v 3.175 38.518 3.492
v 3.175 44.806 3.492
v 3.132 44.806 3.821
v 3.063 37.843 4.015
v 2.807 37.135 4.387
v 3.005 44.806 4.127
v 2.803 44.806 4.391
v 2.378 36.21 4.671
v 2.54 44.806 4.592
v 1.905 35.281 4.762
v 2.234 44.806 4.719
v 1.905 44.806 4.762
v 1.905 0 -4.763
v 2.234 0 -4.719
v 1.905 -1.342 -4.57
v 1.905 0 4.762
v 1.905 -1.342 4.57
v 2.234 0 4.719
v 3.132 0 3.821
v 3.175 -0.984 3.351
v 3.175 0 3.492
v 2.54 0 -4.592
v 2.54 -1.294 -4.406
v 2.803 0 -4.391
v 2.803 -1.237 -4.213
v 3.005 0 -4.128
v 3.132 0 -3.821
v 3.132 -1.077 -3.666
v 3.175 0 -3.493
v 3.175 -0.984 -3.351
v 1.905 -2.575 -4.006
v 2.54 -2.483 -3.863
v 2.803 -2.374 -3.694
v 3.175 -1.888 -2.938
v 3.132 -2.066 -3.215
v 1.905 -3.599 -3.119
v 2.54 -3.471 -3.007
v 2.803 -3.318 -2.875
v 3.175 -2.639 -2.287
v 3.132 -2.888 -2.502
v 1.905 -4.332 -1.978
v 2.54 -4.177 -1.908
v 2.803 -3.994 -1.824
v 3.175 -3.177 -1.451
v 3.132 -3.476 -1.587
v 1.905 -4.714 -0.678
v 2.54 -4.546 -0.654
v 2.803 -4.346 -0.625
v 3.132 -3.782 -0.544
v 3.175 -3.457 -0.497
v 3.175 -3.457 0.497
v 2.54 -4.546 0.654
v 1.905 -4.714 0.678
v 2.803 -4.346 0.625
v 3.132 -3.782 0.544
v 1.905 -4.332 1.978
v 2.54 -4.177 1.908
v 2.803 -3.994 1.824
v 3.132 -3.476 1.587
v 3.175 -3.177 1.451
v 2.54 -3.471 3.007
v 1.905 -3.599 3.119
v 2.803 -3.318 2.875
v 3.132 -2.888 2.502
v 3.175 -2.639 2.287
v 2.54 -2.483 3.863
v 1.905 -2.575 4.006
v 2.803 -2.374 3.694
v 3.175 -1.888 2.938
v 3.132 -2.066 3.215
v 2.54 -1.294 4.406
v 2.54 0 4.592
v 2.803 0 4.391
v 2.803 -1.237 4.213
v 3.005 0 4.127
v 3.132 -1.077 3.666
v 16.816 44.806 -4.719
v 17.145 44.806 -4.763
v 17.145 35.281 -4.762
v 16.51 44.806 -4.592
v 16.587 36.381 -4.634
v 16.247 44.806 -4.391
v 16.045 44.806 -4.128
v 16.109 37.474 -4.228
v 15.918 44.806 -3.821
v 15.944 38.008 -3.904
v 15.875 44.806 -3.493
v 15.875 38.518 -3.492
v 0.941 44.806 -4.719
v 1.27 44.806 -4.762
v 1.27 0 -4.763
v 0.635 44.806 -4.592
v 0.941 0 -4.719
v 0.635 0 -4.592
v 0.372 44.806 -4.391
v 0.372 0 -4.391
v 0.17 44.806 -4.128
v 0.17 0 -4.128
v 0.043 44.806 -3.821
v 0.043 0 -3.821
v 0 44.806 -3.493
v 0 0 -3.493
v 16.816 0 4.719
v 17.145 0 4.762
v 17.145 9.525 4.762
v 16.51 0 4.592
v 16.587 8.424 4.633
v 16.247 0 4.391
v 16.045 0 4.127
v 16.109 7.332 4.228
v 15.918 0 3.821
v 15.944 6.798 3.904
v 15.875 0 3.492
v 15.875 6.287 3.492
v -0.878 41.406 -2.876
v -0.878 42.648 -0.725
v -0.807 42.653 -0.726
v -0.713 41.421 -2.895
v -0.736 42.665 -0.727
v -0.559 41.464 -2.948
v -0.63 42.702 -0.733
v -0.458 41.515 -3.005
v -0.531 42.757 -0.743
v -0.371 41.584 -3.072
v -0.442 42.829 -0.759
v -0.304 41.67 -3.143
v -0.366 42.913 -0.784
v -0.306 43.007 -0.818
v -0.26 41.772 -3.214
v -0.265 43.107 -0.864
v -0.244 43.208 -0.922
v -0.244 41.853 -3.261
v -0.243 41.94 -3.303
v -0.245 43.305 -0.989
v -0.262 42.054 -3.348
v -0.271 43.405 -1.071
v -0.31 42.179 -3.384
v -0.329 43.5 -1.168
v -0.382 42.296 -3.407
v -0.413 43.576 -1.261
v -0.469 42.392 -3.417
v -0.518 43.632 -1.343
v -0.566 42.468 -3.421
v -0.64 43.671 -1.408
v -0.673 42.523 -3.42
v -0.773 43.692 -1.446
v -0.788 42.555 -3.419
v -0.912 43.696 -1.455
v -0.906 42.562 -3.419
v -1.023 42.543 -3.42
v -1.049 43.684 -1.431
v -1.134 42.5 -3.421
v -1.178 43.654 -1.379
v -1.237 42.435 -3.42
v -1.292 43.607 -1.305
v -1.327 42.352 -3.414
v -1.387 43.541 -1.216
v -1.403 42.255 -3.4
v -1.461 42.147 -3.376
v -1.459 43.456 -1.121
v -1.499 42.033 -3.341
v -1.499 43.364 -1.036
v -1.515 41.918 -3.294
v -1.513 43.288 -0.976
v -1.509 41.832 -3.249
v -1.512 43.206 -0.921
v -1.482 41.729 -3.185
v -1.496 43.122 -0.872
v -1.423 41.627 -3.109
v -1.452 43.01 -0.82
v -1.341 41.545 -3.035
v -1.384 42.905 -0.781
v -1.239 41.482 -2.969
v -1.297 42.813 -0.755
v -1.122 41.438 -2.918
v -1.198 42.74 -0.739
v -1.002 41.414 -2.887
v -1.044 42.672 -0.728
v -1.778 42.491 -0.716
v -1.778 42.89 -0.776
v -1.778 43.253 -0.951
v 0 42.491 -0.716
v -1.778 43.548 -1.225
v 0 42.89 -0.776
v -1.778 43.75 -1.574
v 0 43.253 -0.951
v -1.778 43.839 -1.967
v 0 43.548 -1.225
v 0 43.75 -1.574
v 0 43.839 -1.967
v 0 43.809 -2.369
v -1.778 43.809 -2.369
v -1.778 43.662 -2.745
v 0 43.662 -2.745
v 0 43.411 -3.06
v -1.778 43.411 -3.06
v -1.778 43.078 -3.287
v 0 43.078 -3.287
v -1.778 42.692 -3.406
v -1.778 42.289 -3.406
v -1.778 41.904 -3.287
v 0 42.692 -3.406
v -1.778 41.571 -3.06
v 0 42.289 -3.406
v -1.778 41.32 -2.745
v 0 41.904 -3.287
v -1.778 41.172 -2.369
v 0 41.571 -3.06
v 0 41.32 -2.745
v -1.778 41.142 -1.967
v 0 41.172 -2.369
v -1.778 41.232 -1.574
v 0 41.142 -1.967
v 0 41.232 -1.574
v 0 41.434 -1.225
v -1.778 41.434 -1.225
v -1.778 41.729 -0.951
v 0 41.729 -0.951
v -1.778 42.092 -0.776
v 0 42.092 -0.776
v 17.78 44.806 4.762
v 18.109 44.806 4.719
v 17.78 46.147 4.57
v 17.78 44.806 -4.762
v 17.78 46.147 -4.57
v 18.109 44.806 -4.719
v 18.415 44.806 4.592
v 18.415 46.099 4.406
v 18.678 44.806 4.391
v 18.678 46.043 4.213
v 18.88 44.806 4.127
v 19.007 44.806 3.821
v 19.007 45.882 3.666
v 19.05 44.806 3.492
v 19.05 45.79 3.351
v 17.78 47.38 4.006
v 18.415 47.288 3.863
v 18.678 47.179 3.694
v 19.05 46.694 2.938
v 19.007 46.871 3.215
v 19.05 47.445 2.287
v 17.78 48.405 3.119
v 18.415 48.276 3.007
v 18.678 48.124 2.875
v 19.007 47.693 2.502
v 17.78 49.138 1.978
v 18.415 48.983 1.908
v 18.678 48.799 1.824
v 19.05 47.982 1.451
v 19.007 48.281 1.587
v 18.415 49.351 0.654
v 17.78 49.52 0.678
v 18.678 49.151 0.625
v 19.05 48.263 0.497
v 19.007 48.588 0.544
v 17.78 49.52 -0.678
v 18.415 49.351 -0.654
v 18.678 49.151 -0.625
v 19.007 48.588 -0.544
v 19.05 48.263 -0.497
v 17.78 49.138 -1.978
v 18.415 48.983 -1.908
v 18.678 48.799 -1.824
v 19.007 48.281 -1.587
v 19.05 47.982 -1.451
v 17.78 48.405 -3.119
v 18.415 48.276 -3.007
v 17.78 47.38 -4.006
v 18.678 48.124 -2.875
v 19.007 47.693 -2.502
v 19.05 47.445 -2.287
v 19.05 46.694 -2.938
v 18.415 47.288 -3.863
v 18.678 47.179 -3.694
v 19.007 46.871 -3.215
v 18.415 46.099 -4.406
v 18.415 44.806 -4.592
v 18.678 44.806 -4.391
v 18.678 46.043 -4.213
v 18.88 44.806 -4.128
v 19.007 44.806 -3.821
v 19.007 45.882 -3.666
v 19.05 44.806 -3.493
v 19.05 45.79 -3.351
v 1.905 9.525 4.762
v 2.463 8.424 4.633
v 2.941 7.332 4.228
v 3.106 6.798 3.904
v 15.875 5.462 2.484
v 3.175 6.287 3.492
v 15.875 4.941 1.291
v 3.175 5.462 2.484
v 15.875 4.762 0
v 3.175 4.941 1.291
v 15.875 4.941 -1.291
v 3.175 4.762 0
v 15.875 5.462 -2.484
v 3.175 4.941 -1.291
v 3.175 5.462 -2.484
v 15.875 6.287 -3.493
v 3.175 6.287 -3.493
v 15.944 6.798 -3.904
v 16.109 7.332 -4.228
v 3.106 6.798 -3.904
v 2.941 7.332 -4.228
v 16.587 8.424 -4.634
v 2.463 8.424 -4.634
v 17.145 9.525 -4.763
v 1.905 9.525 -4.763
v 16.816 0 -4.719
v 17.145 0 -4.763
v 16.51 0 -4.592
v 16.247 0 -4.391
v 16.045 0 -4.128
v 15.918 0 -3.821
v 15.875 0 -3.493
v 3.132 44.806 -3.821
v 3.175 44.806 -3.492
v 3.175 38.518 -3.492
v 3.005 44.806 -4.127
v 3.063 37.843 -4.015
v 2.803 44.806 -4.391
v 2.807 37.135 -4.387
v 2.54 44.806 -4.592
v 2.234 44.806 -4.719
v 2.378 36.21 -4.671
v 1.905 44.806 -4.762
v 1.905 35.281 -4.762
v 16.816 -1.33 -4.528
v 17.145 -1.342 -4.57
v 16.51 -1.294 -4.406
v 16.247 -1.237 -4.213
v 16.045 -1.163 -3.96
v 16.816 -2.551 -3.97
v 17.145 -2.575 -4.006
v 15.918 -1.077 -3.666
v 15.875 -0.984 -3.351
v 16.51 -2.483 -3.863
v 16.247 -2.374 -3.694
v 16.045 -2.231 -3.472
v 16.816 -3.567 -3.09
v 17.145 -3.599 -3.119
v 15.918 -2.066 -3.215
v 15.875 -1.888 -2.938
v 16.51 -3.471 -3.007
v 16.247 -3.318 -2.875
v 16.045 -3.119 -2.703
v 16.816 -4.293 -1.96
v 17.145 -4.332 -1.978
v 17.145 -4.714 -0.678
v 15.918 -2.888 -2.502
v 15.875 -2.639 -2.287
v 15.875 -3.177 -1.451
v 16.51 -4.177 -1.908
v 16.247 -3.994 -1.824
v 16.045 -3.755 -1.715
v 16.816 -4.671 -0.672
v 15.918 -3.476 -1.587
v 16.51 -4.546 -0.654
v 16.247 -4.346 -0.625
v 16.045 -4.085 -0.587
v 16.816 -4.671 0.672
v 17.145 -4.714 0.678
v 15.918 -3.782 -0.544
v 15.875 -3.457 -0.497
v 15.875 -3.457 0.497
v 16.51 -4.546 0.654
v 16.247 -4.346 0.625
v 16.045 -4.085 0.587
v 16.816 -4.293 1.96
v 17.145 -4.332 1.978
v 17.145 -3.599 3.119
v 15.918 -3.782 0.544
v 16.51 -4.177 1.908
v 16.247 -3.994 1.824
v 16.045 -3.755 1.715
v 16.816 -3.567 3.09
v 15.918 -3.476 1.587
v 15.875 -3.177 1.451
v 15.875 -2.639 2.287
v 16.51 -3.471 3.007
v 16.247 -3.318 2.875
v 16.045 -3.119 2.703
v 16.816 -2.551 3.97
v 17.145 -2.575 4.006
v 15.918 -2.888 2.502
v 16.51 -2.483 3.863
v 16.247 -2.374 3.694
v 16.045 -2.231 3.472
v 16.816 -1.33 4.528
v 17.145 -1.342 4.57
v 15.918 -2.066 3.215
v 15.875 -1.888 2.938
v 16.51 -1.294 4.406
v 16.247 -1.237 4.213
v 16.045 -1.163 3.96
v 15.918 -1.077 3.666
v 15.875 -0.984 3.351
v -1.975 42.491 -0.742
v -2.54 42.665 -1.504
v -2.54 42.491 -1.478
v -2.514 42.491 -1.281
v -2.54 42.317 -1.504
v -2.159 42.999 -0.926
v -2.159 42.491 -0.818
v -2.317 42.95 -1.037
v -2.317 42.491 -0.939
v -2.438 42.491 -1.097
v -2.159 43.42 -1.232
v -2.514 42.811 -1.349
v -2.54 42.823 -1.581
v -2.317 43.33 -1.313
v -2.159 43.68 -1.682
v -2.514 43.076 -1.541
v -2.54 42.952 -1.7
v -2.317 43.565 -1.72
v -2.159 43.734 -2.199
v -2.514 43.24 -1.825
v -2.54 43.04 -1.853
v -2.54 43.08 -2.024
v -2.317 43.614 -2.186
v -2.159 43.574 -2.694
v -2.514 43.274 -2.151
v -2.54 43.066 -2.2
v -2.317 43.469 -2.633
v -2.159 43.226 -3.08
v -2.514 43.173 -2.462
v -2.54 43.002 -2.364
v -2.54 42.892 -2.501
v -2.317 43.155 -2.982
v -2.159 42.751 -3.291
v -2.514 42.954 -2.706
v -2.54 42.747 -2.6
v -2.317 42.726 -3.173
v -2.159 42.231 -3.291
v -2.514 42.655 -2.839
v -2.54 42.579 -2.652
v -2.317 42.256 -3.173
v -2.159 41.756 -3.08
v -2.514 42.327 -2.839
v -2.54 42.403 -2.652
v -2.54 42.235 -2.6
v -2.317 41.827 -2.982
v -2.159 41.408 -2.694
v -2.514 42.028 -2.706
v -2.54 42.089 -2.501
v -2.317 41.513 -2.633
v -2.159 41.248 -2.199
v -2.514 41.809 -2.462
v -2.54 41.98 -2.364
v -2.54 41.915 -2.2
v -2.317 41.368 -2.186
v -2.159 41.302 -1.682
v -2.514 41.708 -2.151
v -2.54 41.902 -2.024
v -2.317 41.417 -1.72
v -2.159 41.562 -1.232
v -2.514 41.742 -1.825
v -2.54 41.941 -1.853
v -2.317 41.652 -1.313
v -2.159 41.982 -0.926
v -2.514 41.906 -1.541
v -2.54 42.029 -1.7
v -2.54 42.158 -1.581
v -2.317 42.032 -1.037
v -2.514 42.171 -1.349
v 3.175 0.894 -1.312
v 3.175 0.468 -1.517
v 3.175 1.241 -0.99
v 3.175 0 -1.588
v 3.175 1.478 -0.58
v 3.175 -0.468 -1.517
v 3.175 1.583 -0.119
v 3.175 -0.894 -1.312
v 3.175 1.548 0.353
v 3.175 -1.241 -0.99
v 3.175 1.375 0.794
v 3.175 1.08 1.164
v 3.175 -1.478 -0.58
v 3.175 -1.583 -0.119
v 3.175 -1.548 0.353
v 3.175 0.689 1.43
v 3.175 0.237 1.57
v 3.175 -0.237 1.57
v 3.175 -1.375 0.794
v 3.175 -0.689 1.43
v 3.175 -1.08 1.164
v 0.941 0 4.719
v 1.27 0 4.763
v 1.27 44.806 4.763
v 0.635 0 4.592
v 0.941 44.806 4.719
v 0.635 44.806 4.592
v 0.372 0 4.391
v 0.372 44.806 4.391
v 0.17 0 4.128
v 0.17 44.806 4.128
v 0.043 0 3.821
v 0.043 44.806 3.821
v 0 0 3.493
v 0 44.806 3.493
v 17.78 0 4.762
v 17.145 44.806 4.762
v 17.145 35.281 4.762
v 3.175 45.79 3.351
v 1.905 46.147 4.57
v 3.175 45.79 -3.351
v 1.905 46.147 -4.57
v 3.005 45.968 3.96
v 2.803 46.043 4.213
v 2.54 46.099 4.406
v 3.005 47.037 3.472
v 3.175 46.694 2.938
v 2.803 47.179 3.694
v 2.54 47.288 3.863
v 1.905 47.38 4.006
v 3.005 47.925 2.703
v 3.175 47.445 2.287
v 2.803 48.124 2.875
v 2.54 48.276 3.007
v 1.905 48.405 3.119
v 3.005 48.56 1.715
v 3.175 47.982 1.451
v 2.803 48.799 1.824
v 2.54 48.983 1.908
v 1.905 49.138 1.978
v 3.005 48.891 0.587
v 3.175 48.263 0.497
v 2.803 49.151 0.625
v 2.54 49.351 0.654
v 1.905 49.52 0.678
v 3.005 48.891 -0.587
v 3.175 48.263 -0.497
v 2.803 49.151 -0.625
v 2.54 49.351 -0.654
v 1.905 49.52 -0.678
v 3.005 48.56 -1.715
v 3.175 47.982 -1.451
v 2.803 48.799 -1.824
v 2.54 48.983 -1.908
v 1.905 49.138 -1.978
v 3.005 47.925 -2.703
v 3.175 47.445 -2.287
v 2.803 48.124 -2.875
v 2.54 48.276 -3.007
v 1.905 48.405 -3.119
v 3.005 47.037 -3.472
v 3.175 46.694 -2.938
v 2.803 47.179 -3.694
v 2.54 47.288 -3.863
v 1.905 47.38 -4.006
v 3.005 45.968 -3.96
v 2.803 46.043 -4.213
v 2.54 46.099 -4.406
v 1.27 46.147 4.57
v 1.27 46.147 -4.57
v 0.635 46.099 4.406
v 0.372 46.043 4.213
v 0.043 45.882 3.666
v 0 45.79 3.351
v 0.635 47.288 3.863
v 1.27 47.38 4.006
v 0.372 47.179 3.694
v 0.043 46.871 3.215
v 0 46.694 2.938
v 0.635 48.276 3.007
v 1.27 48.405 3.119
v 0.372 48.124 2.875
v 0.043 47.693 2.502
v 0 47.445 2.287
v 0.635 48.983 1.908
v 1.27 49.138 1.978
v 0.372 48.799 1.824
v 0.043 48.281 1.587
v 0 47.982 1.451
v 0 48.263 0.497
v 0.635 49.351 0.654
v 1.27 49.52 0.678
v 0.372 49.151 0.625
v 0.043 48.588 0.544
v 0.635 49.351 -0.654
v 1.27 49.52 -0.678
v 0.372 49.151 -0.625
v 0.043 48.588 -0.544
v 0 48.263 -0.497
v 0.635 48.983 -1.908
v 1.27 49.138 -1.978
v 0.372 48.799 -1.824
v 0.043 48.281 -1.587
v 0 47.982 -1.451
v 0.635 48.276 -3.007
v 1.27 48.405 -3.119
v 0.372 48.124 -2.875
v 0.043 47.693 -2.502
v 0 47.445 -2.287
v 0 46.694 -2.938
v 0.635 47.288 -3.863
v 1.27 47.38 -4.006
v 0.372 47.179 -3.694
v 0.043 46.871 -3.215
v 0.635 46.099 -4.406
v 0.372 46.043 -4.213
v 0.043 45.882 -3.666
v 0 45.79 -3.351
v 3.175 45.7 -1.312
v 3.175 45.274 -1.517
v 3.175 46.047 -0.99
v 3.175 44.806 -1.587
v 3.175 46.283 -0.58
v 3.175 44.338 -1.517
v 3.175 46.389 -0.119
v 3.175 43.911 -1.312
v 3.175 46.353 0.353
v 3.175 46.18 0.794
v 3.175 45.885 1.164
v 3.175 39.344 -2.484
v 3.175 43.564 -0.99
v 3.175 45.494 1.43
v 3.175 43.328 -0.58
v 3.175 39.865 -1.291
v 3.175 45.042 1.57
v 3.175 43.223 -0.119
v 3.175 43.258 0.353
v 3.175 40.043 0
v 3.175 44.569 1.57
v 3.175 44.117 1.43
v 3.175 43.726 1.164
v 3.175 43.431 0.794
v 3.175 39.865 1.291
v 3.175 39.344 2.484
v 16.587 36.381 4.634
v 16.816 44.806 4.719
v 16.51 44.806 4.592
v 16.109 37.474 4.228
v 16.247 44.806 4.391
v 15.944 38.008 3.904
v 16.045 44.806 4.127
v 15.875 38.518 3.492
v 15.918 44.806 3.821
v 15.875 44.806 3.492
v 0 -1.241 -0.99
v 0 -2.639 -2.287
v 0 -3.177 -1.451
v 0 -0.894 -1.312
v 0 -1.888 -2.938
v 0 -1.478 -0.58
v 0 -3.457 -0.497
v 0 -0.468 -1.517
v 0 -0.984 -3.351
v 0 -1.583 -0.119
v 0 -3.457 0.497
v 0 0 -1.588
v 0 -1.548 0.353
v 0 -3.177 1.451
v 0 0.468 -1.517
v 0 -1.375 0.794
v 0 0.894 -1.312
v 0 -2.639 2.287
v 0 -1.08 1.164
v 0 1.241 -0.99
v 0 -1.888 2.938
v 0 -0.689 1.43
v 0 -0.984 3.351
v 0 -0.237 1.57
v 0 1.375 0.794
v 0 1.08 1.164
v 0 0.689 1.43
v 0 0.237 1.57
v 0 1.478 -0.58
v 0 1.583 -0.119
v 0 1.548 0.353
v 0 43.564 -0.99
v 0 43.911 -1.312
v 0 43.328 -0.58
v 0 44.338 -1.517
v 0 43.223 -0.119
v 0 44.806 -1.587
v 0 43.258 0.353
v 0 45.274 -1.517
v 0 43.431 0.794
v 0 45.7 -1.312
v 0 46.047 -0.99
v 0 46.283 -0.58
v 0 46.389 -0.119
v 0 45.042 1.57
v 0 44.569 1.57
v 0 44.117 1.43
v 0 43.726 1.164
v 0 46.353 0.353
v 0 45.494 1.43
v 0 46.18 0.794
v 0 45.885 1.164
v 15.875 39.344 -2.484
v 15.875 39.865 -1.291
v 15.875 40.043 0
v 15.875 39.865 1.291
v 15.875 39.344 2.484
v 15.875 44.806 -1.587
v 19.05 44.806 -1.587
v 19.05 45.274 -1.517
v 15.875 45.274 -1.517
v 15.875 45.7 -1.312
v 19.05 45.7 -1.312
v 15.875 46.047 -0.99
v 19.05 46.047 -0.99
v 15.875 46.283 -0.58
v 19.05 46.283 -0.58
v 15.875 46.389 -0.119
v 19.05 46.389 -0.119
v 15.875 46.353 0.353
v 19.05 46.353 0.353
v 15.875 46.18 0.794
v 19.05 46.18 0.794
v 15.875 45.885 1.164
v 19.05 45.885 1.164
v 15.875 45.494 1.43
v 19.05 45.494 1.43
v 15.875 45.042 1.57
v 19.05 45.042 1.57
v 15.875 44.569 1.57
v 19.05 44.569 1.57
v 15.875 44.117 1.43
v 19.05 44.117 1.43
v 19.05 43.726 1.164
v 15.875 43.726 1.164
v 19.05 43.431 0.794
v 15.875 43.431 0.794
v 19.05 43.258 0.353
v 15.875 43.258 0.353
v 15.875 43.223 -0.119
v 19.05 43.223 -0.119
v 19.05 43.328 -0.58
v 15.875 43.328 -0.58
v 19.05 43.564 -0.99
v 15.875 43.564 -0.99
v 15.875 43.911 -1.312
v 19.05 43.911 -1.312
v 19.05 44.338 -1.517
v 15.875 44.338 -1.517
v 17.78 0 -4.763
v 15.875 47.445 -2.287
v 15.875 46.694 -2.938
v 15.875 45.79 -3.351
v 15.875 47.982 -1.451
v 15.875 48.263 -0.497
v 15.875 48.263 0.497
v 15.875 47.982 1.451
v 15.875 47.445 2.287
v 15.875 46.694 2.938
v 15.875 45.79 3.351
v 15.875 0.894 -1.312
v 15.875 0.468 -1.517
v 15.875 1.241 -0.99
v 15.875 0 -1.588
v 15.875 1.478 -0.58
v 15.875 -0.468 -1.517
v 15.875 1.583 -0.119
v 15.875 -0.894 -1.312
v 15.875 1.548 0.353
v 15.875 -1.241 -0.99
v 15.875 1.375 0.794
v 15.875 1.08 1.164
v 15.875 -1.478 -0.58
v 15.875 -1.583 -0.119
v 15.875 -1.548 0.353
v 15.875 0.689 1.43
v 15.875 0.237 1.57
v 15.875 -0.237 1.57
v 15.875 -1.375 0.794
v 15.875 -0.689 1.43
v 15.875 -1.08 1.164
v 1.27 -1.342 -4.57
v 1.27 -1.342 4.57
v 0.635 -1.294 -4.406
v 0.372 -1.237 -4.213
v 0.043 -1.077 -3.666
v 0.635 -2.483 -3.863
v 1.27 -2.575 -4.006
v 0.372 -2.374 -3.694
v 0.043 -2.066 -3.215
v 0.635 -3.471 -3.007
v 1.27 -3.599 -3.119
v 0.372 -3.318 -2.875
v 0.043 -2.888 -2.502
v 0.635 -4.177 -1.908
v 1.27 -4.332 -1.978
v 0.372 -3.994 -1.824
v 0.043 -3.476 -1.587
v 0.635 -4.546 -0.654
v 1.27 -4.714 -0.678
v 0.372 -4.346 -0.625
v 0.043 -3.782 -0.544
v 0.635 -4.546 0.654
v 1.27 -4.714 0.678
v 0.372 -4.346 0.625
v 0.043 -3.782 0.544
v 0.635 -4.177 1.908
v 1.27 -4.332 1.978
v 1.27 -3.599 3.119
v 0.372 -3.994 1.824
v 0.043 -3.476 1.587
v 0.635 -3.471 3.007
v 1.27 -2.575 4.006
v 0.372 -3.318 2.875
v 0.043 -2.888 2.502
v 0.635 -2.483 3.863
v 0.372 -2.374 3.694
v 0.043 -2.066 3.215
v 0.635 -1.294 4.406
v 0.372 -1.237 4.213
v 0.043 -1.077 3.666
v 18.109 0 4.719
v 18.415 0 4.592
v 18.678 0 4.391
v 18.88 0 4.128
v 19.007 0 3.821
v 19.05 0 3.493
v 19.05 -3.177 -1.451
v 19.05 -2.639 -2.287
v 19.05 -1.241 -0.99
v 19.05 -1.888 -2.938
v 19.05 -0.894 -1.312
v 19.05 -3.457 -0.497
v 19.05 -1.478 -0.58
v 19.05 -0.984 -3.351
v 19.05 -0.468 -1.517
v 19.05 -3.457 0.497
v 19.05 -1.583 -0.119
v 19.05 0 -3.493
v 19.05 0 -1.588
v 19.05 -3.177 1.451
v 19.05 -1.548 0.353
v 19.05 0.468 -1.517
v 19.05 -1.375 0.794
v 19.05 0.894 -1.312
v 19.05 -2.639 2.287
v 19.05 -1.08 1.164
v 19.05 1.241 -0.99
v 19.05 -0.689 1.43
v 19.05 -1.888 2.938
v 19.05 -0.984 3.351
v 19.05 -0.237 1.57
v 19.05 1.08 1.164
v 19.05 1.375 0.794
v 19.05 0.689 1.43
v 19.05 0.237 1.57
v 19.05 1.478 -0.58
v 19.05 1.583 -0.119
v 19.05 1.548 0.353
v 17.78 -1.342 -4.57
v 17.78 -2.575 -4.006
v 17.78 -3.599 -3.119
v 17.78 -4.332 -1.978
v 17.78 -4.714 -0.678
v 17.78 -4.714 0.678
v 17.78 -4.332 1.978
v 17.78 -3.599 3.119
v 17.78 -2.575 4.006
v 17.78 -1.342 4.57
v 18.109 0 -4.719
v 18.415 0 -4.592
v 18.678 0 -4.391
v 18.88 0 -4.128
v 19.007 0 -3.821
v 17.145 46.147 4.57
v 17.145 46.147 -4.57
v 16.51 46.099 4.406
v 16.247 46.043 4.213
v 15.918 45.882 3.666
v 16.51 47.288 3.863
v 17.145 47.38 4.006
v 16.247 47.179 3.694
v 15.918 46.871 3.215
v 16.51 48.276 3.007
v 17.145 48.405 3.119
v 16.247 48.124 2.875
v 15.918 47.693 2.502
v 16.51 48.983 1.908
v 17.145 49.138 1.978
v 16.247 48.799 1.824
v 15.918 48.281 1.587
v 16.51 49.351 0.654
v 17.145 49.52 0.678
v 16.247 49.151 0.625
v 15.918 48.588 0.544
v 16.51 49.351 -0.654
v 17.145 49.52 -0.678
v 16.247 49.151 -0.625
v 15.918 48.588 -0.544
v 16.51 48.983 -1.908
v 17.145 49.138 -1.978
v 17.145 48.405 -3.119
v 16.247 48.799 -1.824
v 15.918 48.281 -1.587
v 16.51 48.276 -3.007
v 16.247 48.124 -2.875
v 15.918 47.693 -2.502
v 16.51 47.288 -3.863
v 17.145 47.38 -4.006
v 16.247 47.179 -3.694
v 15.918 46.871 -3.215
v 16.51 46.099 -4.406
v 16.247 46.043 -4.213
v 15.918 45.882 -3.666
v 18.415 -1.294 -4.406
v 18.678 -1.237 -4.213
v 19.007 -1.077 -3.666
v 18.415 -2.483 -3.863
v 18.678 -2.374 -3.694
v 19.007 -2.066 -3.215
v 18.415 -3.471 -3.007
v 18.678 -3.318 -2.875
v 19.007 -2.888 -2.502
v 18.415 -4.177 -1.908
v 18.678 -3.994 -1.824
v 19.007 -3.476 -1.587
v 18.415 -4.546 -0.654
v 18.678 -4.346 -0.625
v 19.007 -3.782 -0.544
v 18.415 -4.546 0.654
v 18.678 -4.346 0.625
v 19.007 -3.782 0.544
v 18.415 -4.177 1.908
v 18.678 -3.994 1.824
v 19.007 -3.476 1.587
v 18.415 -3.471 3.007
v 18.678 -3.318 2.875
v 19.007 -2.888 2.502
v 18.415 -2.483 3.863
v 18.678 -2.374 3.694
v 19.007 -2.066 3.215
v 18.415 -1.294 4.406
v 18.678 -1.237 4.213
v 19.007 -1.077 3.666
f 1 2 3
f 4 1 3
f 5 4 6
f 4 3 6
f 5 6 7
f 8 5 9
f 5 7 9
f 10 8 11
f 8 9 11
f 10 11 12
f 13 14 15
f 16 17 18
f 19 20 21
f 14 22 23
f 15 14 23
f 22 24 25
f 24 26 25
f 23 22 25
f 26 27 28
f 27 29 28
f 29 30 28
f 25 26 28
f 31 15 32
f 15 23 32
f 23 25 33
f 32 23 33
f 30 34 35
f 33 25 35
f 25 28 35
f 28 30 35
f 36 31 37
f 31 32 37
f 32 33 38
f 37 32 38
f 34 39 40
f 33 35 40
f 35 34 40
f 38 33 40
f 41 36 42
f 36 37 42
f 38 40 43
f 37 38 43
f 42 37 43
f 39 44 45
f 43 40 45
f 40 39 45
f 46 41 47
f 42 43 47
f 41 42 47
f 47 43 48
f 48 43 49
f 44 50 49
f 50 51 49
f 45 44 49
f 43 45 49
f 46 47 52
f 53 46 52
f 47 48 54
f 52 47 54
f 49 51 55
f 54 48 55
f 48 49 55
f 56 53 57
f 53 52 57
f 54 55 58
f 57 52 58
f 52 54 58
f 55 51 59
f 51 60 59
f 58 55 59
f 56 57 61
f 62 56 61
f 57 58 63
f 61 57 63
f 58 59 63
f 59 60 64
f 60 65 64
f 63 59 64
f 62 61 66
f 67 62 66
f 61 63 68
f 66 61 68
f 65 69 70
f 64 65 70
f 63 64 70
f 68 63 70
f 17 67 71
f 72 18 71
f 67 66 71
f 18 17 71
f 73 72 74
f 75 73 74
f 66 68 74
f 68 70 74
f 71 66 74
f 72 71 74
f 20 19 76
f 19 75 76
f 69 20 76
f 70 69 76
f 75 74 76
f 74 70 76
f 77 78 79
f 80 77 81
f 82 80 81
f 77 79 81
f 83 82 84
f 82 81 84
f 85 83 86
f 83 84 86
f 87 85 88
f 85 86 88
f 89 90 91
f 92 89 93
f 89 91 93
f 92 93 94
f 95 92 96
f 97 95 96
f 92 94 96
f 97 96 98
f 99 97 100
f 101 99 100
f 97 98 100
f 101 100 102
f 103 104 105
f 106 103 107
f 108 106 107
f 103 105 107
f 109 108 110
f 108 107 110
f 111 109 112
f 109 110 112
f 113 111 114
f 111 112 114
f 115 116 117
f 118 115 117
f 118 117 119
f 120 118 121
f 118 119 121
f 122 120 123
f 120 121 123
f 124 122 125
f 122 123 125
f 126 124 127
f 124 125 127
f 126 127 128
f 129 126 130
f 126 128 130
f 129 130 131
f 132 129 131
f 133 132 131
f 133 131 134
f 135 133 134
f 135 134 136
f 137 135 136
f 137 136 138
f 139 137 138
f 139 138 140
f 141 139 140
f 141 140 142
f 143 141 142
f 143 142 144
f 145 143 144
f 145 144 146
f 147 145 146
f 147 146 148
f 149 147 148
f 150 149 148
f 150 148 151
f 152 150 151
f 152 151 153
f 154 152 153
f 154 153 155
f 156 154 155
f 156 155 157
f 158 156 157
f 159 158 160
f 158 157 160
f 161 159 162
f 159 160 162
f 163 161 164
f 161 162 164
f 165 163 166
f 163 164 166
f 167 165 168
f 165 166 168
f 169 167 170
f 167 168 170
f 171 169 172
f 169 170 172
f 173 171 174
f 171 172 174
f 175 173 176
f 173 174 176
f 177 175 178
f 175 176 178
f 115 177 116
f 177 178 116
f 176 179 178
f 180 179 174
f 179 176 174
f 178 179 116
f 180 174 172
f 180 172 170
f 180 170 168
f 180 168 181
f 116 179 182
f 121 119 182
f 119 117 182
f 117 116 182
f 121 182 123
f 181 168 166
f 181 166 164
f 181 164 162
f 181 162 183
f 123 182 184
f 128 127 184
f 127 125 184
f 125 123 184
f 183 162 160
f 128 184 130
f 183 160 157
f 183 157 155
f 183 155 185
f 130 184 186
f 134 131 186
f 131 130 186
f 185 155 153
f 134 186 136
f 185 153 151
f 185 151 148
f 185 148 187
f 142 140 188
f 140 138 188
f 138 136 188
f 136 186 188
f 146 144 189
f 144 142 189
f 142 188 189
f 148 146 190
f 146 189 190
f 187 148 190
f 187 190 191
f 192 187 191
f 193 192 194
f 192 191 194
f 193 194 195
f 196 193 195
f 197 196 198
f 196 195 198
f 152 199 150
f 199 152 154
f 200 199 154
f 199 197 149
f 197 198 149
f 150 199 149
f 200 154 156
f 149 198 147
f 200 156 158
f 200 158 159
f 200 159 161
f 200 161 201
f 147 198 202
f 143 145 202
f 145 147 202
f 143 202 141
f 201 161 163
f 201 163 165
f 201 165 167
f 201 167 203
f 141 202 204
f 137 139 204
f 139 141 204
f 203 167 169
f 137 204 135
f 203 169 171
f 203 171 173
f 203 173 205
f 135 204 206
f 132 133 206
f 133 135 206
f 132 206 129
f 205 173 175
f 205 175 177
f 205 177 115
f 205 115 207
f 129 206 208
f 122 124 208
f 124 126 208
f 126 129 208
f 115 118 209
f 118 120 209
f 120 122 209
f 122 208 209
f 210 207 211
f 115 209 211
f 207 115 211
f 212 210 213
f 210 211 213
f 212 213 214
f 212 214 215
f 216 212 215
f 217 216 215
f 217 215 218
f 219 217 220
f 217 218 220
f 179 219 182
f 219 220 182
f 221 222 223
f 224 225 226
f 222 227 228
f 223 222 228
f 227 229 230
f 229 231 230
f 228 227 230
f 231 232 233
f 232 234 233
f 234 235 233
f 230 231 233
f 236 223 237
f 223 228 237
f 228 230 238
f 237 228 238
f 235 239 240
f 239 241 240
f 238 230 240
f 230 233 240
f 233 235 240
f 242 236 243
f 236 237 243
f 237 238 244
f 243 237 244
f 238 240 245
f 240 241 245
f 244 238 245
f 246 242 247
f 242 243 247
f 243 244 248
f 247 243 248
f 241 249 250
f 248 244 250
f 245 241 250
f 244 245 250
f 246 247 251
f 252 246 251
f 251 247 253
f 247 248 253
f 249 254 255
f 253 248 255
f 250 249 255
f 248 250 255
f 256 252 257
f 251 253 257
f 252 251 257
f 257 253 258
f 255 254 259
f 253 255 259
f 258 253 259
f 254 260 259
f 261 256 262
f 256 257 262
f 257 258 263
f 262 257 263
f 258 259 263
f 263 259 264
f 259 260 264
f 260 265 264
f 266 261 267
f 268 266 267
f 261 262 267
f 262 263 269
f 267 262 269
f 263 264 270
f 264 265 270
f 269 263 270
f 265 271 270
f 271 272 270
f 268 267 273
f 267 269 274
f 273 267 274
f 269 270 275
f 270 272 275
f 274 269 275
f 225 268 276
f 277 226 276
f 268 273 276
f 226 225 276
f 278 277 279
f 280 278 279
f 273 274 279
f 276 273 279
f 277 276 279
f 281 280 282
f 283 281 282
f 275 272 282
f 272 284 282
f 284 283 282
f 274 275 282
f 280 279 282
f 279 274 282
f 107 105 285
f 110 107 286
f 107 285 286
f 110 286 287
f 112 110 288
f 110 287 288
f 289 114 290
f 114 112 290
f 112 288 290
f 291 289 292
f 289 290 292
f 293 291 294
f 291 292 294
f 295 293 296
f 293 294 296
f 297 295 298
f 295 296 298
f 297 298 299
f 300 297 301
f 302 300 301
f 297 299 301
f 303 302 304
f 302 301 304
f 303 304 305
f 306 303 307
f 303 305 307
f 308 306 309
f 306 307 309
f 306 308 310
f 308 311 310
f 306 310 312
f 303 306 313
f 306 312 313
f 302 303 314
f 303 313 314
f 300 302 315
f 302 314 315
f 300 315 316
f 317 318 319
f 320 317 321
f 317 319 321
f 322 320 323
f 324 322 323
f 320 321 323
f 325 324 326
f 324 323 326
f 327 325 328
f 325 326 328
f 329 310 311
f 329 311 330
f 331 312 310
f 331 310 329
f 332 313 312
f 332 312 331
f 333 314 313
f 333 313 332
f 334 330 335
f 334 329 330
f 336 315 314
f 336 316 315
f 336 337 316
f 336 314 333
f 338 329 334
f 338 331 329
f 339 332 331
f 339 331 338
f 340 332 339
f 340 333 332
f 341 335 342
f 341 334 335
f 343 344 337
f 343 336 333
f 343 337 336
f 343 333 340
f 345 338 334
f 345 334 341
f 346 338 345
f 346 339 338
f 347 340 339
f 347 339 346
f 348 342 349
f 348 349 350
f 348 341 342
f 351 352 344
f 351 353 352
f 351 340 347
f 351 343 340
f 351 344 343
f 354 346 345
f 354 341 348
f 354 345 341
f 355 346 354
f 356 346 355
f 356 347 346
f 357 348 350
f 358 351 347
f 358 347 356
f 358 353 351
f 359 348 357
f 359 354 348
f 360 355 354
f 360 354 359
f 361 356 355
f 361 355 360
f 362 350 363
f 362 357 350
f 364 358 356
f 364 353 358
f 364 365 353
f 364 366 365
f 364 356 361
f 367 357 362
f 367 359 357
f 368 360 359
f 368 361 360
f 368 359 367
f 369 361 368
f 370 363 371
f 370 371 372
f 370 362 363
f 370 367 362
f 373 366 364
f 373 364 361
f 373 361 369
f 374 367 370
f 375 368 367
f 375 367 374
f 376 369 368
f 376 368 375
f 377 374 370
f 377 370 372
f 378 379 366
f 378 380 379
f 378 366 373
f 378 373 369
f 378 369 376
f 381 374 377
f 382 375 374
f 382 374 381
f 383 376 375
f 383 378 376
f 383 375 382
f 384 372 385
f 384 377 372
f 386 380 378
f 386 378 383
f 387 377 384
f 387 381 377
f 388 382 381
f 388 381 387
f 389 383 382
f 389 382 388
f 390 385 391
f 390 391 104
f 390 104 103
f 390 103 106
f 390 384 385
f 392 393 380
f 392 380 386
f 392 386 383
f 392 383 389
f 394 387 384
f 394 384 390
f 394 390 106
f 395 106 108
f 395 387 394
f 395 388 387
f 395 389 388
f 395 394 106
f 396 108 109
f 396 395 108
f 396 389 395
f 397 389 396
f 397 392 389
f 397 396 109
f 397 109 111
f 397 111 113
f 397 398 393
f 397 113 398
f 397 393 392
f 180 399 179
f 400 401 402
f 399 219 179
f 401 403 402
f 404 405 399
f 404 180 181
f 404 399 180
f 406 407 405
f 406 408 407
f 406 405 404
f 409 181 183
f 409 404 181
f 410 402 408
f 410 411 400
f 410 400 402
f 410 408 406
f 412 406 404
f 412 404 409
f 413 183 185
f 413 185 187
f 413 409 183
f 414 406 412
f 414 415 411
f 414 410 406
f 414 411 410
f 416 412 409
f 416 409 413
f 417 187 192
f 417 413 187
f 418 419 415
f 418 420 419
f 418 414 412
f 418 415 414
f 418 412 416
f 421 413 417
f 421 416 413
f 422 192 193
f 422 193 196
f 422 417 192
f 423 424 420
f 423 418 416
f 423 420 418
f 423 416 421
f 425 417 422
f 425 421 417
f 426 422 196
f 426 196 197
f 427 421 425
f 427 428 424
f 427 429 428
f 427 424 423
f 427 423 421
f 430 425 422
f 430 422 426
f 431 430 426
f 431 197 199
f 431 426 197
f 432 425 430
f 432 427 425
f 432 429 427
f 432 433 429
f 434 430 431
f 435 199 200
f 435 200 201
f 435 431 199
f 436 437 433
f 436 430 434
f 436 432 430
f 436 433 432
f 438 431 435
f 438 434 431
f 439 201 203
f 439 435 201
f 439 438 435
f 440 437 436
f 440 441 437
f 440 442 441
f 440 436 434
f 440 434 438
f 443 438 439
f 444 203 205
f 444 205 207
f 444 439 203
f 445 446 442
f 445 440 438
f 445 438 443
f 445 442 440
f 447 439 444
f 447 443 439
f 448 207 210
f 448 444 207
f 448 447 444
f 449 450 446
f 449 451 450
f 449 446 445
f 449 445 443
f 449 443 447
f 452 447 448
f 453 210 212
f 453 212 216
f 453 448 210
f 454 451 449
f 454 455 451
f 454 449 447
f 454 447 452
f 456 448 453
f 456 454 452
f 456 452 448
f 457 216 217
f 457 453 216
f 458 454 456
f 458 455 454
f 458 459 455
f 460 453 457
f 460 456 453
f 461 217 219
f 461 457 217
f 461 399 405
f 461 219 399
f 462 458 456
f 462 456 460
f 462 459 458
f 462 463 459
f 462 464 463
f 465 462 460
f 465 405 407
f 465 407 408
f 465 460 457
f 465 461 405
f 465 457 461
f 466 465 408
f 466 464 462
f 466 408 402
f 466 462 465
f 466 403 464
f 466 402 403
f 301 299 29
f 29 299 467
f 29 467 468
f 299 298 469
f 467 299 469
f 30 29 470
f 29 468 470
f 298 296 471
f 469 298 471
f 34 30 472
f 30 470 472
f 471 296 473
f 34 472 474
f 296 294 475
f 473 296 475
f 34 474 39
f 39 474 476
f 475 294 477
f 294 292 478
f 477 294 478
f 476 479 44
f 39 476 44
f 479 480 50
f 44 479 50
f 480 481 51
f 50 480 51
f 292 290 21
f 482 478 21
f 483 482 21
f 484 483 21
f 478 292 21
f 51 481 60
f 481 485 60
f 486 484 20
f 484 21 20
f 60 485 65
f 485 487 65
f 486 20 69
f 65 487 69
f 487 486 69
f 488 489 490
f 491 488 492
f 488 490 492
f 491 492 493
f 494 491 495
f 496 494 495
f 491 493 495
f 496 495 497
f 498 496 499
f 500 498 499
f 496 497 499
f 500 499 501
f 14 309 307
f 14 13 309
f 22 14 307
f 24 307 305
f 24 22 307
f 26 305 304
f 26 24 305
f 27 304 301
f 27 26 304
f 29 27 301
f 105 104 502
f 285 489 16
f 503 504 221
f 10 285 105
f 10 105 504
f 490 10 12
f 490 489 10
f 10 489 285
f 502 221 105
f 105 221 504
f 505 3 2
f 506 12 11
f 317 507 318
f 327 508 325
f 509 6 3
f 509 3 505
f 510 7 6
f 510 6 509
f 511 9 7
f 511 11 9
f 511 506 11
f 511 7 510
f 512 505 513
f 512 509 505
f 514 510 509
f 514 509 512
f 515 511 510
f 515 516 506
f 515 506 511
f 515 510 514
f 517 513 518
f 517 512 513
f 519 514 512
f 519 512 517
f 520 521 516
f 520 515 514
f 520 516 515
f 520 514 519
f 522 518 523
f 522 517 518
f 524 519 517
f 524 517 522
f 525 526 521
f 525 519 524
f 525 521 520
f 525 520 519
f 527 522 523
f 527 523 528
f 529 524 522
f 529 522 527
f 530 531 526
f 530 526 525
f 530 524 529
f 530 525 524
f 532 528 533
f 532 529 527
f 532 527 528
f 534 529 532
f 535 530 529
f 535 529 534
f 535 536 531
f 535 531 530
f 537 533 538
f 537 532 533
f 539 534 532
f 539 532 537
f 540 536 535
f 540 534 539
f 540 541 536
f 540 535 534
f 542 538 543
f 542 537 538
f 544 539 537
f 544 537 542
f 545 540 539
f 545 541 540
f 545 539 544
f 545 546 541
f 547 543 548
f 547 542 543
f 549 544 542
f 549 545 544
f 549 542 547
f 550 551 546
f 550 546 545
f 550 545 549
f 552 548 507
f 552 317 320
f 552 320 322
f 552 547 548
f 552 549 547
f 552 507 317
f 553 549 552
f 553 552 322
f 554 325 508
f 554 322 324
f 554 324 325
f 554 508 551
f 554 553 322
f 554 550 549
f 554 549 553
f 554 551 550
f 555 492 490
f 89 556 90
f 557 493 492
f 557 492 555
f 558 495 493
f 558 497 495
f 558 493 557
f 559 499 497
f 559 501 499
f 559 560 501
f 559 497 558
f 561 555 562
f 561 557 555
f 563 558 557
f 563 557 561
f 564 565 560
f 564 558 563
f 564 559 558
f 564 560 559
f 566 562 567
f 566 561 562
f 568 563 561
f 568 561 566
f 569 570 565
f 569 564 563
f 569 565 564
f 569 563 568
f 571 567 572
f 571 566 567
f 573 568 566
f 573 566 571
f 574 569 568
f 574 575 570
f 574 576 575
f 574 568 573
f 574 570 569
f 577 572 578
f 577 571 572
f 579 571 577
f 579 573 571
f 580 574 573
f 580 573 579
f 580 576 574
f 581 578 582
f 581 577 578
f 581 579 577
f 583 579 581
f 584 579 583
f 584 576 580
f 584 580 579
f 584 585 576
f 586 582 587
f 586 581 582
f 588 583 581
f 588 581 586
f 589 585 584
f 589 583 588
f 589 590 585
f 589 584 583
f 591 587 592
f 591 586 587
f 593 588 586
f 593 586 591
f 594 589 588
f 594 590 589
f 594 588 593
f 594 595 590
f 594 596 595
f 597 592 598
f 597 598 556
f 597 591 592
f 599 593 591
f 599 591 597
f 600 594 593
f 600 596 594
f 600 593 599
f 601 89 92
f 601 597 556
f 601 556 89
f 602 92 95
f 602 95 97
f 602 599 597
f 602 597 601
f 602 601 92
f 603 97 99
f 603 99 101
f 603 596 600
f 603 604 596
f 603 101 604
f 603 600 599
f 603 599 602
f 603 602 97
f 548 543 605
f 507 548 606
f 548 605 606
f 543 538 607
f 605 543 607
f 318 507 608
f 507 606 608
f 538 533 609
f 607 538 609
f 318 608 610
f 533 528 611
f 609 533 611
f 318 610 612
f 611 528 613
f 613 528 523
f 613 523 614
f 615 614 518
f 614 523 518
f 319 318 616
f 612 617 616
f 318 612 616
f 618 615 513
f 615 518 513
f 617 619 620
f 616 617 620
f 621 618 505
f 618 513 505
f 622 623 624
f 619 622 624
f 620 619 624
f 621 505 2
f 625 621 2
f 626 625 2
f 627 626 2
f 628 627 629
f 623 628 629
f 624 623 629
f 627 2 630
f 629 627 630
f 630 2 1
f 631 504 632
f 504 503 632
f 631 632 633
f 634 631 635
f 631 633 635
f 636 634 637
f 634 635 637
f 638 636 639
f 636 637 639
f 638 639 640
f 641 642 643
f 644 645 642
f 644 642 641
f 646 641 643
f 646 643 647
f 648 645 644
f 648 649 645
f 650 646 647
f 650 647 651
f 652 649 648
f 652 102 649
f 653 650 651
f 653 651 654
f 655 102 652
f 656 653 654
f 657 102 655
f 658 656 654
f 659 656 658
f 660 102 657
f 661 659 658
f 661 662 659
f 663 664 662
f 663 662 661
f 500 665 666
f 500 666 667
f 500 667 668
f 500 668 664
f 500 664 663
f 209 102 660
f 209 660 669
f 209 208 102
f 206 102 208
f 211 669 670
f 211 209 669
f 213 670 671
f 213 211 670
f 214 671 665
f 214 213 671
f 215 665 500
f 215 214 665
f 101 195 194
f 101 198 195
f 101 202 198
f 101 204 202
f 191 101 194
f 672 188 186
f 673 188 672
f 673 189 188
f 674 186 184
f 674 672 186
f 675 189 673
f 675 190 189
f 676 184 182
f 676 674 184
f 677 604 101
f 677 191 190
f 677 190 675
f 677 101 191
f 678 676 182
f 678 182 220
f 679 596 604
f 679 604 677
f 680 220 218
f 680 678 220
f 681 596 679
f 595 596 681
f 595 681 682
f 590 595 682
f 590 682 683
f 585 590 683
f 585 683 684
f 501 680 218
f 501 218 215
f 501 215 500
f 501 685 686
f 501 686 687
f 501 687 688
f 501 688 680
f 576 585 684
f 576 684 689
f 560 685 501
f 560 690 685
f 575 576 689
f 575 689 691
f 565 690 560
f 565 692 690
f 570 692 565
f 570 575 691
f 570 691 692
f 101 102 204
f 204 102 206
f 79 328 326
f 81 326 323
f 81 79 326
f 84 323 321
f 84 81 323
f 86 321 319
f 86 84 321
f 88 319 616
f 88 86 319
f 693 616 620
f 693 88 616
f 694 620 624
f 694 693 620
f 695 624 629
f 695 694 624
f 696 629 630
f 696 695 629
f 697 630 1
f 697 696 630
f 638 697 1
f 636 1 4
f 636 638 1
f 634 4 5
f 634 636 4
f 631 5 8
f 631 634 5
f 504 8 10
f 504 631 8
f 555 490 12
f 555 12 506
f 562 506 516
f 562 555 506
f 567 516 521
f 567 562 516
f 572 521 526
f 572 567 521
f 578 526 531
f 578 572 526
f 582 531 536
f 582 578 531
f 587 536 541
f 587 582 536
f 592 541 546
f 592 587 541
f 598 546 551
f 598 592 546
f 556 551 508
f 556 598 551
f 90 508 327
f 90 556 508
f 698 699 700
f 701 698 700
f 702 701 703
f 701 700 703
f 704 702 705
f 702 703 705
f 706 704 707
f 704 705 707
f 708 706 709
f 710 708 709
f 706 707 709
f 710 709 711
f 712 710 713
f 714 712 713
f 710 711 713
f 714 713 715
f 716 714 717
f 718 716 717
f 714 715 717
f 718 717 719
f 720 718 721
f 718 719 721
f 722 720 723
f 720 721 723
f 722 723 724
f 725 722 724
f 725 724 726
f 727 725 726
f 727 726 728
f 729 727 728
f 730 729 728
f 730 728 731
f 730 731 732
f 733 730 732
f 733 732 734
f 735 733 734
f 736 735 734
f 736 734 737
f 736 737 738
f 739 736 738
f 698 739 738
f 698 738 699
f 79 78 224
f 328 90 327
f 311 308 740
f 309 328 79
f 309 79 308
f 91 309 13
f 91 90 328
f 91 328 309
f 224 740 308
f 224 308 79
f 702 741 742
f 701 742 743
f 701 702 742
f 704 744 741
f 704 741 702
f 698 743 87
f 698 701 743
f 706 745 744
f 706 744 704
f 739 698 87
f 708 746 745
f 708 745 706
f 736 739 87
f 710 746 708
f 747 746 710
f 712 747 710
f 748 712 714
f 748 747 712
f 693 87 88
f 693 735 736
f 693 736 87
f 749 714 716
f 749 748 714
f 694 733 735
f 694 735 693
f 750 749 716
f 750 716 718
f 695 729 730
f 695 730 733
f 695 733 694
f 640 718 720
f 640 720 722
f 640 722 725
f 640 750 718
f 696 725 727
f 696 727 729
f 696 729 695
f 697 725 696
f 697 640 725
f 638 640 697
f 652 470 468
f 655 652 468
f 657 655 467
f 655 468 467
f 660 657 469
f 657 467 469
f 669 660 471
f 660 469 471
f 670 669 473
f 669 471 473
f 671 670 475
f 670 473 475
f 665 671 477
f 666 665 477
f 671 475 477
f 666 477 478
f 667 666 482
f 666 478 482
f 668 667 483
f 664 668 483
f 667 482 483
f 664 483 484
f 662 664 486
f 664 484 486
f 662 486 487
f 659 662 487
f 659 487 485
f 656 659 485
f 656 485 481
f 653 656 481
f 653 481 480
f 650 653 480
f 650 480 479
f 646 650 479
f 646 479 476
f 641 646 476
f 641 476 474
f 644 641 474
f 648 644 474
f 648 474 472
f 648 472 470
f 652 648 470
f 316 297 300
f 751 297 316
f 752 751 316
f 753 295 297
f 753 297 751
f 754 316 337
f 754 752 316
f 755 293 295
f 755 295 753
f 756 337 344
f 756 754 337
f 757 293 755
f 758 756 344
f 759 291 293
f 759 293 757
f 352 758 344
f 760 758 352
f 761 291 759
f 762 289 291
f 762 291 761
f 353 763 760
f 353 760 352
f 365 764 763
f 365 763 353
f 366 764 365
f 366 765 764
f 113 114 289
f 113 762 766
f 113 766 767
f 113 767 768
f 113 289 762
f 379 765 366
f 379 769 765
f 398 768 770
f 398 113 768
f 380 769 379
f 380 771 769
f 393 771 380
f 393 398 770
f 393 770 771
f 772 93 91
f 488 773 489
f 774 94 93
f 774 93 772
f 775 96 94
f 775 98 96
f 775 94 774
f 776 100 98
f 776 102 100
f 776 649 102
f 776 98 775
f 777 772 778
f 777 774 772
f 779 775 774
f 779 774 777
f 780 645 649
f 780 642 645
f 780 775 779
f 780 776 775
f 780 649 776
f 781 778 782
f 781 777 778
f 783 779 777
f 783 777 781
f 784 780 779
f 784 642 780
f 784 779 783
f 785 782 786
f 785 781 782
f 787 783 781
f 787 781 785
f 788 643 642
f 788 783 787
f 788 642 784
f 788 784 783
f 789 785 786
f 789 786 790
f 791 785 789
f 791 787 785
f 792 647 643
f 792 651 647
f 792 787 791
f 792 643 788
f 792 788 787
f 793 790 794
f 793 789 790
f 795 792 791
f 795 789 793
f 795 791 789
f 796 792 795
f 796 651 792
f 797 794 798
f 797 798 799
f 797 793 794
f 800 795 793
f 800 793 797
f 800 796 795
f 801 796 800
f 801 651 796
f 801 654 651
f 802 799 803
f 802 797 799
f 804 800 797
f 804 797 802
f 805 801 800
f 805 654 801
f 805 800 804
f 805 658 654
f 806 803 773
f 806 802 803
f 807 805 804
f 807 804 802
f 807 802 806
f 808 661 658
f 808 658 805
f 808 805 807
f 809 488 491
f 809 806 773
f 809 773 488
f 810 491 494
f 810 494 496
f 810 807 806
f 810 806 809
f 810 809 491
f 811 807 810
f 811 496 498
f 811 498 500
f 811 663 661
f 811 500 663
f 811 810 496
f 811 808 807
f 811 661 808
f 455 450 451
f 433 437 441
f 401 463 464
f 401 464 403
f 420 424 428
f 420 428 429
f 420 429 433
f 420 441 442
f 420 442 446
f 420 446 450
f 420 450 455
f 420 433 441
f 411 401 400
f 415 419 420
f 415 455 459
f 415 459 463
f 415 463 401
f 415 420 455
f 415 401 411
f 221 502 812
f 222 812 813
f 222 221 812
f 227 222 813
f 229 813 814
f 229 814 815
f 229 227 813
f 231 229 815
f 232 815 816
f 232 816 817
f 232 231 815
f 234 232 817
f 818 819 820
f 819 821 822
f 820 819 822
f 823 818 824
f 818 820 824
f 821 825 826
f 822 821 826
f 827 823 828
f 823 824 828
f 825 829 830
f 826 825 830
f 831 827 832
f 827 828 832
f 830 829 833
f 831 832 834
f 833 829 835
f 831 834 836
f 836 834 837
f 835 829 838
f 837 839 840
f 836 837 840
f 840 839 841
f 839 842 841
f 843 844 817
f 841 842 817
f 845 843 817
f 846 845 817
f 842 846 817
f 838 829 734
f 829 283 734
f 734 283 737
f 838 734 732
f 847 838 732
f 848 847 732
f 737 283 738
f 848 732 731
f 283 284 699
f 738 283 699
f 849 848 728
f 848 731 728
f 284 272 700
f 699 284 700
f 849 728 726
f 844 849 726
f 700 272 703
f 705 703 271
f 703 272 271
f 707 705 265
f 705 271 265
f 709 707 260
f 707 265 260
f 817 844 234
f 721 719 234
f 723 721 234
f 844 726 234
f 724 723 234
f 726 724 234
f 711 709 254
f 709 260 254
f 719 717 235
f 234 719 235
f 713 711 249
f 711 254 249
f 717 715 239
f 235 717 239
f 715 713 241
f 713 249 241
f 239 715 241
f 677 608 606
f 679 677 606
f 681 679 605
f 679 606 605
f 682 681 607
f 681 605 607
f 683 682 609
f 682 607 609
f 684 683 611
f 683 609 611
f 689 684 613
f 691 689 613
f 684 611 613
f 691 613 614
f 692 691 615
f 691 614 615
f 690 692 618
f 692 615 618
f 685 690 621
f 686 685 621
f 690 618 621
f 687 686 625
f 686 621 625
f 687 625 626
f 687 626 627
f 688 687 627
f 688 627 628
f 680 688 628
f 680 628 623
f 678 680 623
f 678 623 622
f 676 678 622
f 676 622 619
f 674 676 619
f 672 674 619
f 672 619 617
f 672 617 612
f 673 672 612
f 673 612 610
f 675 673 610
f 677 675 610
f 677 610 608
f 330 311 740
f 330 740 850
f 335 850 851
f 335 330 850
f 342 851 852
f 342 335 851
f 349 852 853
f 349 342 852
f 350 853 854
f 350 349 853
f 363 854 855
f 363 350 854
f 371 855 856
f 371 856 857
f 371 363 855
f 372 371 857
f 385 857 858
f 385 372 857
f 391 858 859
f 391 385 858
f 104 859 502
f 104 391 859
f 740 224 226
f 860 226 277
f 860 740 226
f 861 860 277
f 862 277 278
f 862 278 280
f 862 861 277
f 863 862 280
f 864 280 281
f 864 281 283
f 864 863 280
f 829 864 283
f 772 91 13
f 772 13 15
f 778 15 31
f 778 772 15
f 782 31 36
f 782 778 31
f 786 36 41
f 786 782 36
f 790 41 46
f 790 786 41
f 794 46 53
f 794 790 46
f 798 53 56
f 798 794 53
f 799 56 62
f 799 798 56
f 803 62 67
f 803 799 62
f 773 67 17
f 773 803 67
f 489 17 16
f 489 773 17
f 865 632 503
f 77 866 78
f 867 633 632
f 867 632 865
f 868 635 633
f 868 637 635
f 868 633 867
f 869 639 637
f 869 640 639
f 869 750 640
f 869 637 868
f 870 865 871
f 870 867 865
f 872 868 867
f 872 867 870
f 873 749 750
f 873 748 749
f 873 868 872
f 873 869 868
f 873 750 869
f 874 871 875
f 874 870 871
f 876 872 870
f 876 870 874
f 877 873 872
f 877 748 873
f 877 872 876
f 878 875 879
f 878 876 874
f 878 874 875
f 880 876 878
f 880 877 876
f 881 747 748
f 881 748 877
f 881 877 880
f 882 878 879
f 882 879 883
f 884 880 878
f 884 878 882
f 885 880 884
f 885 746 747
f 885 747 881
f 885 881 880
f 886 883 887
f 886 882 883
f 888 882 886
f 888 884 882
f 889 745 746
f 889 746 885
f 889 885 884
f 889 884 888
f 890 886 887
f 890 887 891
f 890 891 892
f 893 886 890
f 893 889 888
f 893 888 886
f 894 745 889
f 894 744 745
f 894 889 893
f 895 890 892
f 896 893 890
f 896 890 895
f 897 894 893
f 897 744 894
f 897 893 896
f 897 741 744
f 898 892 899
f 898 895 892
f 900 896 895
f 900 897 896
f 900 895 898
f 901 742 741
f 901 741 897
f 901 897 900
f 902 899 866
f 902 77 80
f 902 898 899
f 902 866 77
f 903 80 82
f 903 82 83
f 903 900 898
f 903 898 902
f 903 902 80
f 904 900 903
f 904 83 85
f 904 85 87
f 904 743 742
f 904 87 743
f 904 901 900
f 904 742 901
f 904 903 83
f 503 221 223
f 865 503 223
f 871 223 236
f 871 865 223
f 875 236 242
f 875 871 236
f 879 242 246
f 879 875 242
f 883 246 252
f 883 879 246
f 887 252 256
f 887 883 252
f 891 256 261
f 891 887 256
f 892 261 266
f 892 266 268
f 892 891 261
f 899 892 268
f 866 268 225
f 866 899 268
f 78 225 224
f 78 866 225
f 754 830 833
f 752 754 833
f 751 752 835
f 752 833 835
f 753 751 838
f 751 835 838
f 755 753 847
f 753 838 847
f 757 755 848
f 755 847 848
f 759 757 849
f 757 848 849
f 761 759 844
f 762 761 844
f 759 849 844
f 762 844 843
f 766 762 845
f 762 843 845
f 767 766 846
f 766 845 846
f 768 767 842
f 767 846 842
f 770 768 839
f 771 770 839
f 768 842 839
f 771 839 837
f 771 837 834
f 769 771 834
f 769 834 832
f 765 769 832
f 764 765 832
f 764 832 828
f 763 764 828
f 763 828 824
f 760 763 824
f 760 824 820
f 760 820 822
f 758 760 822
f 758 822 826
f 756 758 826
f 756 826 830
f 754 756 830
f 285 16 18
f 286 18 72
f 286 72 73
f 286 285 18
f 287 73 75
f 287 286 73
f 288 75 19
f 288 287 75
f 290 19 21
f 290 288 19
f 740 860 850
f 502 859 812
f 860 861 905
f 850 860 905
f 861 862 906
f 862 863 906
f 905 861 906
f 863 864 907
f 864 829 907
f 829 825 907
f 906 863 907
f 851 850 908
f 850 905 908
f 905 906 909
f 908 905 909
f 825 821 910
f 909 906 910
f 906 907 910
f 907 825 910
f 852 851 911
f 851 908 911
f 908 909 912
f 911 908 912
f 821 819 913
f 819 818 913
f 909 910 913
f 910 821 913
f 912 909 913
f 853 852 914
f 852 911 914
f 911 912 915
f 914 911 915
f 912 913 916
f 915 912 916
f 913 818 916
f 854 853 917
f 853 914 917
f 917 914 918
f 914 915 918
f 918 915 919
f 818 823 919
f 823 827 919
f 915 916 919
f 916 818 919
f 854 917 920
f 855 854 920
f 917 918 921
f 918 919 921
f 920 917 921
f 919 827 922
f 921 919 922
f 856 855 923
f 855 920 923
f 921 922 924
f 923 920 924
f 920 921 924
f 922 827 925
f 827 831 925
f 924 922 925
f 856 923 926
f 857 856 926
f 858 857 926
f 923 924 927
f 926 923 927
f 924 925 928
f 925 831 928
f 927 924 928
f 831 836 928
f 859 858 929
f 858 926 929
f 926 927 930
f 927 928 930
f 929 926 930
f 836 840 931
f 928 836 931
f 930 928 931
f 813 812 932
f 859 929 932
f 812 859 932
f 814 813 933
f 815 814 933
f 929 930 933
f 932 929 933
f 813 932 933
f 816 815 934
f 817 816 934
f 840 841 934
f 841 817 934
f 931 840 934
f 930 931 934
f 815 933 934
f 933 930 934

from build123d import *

# Parameters (mm, degrees)
BOSS_EXTRUDE1_DEPTH = 19.05
SKETCH2_R           = 1.5875
SKETCH2_R_2         = 1.5874999999999988
CUT_EXTRUDE1_DEPTH  = 19.05
CUT_EXTRUDE2_DEPTH  = 6.35
FILLET1_R           = 1.27
SKETCH3_R           = 1.3523393116529026
BOSS_EXTRUDE2_DEPTH = 2.54
FILLET2_R           = 0.762
SKETCH4_R           = 0.6365323226185287
CUT_EXTRUDE3_DEPTH  = 50.150613196033525


with BuildPart() as part:
    # Sketch1 → Boss-Extrude1 (new body)
    with BuildSketch(Plane(origin=(0, 0, 0), x_dir=(0, 0, -1), z_dir=(1, 0, 0))):
        with BuildLine():
            Line((-4.7625, 0), (-4.7625, 44.8056))
            ThreePointArc((-4.7625, 44.8056), (2.9e-16, 49.5681), (4.7625, 44.8056))
            Line((4.7625, 44.8056), (4.762500000000005, 5.8e-16))
            ThreePointArc((4.762500000000005, 5.8e-16), (1.35e-15, -4.762500000000005), (-4.7625, 0))
        make_face()
    extrude(amount=BOSS_EXTRUDE1_DEPTH)

    # Sketch2 → Cut-Extrude1 (cut)
    with BuildSketch(Plane(origin=(19.05, 0, 0), x_dir=(0, 0, -1), z_dir=(1, 0, 0))):
        Circle(SKETCH2_R)
        with Locations((0, 44.8056)):
            Circle(SKETCH2_R_2)
    extrude(amount=-CUT_EXTRUDE1_DEPTH, mode=Mode.SUBTRACT)

    # 3DSketch1 → Cut-Extrude2 (cut, symmetric)
    with BuildSketch(Plane(origin=(9.524999999999954, 44.80559999999997, -4.762500000000004), x_dir=(0, -0.9781419365644765, 0.20793833685469326), z_dir=(-1, -9.3e-16, 3.6e-16))):
        with BuildLine():
            Line((0, 0), (9.316801945776646, -1.9806126585409503))
            ThreePointArc((9.316801945776646, -1.9806126585409503), (5.6487073021588, 3.668094643617845), (11.2974146043176, 7.336189287235693))
            Line((11.2974146043176, 7.336189287235693), (1.9806126585409412, 9.316801945776648))
            ThreePointArc((1.9806126585409412, 9.316801945776648), (-3.6680946436178474, 5.648707302158794), (0, 0))
        make_face()
        with BuildLine():
            Line((45.806849011474235, 0), (36.49004706569759, 1.980612658540955))
            ThreePointArc((36.49004706569759, 1.980612658540955), (40.15814170931544, -3.668094643617836), (34.50943440715664, -7.336189287235687))
            Line((34.50943440715664, -7.336189287235687), (43.82623635293327, -9.316801945776637))
            ThreePointArc((43.82623635293327, -9.316801945776637), (49.47494365509206, -5.648707302158793), (45.806849011474235, 0))
        make_face()
    extrude(amount=CUT_EXTRUDE2_DEPTH, both=True, mode=Mode.SUBTRACT)

    # Fillet1
    fillet1_edges = [part.edges().sort_by_distance(p)[0] for p in [
        (19.05, 49.5681, 7e-17),
        (19.05, 22.4028, 4.7625),
        (15.874999999999961, 40.04309999999998, 4.762500000000003),
        (15.874999999999957, 40.043099999999974, -4.762500000000005),
        (3.174999999999959, 40.04309999999996, -4.762499999999999),
        (3.1749999999999625, 40.04309999999997, 4.762500000000008),
        (19.05, -4.762500000000005, -2.98e-15),
        (0, 22.4028, 4.7625),
        (0, 49.5681, 7e-17),
        (15.874999999999995, 4.762500000000003, 4.762499999999996),
        (15.874999999999991, 4.762500000000003, -4.762500000000006),
        (3.1749999999999954, 4.762499999999989, 4.762500000000001),
        (3.174999999999992, 4.762499999999989, -4.762500000000001),
        (0, 22.4028, -4.762500000000003),
        (0, -4.762500000000005, -2.98e-15),
        (19.05, 22.4028, -4.762500000000003),
    ]]
    fillet(fillet1_edges, radius=FILLET1_R)

    # Sketch3 → Boss-Extrude2 (add)
    with BuildSketch(Plane.ZY):
        with Locations((-2.068463746823568, 42.49092897757123)):
            Circle(SKETCH3_R)
    extrude(amount=BOSS_EXTRUDE2_DEPTH)

    # Fillet2
    fillet2_edges = [part.edges().sort_by_distance(p)[0] for p in [
        (-2.54, 42.49092897757123, -3.42080305847647),
    ]]
    fillet(fillet2_edges, radius=FILLET2_R)

    # Sketch4 → Cut-Extrude3 (cut, through all)
    with BuildSketch(Plane(origin=(0, 10.403230824440865, 18.01892435079848), x_dir=(-1, 0, 0), z_dir=(0, 0.49999999999999484, 0.8660254037844416))):
        with Locations(Location((0.8782218587697344, -37.93359892462922, 0), (0, 0, 90))):
            Circle(SKETCH4_R)
    extrude(amount=-CUT_EXTRUDE3_DEPTH, mode=Mode.SUBTRACT)


solid = part.part
